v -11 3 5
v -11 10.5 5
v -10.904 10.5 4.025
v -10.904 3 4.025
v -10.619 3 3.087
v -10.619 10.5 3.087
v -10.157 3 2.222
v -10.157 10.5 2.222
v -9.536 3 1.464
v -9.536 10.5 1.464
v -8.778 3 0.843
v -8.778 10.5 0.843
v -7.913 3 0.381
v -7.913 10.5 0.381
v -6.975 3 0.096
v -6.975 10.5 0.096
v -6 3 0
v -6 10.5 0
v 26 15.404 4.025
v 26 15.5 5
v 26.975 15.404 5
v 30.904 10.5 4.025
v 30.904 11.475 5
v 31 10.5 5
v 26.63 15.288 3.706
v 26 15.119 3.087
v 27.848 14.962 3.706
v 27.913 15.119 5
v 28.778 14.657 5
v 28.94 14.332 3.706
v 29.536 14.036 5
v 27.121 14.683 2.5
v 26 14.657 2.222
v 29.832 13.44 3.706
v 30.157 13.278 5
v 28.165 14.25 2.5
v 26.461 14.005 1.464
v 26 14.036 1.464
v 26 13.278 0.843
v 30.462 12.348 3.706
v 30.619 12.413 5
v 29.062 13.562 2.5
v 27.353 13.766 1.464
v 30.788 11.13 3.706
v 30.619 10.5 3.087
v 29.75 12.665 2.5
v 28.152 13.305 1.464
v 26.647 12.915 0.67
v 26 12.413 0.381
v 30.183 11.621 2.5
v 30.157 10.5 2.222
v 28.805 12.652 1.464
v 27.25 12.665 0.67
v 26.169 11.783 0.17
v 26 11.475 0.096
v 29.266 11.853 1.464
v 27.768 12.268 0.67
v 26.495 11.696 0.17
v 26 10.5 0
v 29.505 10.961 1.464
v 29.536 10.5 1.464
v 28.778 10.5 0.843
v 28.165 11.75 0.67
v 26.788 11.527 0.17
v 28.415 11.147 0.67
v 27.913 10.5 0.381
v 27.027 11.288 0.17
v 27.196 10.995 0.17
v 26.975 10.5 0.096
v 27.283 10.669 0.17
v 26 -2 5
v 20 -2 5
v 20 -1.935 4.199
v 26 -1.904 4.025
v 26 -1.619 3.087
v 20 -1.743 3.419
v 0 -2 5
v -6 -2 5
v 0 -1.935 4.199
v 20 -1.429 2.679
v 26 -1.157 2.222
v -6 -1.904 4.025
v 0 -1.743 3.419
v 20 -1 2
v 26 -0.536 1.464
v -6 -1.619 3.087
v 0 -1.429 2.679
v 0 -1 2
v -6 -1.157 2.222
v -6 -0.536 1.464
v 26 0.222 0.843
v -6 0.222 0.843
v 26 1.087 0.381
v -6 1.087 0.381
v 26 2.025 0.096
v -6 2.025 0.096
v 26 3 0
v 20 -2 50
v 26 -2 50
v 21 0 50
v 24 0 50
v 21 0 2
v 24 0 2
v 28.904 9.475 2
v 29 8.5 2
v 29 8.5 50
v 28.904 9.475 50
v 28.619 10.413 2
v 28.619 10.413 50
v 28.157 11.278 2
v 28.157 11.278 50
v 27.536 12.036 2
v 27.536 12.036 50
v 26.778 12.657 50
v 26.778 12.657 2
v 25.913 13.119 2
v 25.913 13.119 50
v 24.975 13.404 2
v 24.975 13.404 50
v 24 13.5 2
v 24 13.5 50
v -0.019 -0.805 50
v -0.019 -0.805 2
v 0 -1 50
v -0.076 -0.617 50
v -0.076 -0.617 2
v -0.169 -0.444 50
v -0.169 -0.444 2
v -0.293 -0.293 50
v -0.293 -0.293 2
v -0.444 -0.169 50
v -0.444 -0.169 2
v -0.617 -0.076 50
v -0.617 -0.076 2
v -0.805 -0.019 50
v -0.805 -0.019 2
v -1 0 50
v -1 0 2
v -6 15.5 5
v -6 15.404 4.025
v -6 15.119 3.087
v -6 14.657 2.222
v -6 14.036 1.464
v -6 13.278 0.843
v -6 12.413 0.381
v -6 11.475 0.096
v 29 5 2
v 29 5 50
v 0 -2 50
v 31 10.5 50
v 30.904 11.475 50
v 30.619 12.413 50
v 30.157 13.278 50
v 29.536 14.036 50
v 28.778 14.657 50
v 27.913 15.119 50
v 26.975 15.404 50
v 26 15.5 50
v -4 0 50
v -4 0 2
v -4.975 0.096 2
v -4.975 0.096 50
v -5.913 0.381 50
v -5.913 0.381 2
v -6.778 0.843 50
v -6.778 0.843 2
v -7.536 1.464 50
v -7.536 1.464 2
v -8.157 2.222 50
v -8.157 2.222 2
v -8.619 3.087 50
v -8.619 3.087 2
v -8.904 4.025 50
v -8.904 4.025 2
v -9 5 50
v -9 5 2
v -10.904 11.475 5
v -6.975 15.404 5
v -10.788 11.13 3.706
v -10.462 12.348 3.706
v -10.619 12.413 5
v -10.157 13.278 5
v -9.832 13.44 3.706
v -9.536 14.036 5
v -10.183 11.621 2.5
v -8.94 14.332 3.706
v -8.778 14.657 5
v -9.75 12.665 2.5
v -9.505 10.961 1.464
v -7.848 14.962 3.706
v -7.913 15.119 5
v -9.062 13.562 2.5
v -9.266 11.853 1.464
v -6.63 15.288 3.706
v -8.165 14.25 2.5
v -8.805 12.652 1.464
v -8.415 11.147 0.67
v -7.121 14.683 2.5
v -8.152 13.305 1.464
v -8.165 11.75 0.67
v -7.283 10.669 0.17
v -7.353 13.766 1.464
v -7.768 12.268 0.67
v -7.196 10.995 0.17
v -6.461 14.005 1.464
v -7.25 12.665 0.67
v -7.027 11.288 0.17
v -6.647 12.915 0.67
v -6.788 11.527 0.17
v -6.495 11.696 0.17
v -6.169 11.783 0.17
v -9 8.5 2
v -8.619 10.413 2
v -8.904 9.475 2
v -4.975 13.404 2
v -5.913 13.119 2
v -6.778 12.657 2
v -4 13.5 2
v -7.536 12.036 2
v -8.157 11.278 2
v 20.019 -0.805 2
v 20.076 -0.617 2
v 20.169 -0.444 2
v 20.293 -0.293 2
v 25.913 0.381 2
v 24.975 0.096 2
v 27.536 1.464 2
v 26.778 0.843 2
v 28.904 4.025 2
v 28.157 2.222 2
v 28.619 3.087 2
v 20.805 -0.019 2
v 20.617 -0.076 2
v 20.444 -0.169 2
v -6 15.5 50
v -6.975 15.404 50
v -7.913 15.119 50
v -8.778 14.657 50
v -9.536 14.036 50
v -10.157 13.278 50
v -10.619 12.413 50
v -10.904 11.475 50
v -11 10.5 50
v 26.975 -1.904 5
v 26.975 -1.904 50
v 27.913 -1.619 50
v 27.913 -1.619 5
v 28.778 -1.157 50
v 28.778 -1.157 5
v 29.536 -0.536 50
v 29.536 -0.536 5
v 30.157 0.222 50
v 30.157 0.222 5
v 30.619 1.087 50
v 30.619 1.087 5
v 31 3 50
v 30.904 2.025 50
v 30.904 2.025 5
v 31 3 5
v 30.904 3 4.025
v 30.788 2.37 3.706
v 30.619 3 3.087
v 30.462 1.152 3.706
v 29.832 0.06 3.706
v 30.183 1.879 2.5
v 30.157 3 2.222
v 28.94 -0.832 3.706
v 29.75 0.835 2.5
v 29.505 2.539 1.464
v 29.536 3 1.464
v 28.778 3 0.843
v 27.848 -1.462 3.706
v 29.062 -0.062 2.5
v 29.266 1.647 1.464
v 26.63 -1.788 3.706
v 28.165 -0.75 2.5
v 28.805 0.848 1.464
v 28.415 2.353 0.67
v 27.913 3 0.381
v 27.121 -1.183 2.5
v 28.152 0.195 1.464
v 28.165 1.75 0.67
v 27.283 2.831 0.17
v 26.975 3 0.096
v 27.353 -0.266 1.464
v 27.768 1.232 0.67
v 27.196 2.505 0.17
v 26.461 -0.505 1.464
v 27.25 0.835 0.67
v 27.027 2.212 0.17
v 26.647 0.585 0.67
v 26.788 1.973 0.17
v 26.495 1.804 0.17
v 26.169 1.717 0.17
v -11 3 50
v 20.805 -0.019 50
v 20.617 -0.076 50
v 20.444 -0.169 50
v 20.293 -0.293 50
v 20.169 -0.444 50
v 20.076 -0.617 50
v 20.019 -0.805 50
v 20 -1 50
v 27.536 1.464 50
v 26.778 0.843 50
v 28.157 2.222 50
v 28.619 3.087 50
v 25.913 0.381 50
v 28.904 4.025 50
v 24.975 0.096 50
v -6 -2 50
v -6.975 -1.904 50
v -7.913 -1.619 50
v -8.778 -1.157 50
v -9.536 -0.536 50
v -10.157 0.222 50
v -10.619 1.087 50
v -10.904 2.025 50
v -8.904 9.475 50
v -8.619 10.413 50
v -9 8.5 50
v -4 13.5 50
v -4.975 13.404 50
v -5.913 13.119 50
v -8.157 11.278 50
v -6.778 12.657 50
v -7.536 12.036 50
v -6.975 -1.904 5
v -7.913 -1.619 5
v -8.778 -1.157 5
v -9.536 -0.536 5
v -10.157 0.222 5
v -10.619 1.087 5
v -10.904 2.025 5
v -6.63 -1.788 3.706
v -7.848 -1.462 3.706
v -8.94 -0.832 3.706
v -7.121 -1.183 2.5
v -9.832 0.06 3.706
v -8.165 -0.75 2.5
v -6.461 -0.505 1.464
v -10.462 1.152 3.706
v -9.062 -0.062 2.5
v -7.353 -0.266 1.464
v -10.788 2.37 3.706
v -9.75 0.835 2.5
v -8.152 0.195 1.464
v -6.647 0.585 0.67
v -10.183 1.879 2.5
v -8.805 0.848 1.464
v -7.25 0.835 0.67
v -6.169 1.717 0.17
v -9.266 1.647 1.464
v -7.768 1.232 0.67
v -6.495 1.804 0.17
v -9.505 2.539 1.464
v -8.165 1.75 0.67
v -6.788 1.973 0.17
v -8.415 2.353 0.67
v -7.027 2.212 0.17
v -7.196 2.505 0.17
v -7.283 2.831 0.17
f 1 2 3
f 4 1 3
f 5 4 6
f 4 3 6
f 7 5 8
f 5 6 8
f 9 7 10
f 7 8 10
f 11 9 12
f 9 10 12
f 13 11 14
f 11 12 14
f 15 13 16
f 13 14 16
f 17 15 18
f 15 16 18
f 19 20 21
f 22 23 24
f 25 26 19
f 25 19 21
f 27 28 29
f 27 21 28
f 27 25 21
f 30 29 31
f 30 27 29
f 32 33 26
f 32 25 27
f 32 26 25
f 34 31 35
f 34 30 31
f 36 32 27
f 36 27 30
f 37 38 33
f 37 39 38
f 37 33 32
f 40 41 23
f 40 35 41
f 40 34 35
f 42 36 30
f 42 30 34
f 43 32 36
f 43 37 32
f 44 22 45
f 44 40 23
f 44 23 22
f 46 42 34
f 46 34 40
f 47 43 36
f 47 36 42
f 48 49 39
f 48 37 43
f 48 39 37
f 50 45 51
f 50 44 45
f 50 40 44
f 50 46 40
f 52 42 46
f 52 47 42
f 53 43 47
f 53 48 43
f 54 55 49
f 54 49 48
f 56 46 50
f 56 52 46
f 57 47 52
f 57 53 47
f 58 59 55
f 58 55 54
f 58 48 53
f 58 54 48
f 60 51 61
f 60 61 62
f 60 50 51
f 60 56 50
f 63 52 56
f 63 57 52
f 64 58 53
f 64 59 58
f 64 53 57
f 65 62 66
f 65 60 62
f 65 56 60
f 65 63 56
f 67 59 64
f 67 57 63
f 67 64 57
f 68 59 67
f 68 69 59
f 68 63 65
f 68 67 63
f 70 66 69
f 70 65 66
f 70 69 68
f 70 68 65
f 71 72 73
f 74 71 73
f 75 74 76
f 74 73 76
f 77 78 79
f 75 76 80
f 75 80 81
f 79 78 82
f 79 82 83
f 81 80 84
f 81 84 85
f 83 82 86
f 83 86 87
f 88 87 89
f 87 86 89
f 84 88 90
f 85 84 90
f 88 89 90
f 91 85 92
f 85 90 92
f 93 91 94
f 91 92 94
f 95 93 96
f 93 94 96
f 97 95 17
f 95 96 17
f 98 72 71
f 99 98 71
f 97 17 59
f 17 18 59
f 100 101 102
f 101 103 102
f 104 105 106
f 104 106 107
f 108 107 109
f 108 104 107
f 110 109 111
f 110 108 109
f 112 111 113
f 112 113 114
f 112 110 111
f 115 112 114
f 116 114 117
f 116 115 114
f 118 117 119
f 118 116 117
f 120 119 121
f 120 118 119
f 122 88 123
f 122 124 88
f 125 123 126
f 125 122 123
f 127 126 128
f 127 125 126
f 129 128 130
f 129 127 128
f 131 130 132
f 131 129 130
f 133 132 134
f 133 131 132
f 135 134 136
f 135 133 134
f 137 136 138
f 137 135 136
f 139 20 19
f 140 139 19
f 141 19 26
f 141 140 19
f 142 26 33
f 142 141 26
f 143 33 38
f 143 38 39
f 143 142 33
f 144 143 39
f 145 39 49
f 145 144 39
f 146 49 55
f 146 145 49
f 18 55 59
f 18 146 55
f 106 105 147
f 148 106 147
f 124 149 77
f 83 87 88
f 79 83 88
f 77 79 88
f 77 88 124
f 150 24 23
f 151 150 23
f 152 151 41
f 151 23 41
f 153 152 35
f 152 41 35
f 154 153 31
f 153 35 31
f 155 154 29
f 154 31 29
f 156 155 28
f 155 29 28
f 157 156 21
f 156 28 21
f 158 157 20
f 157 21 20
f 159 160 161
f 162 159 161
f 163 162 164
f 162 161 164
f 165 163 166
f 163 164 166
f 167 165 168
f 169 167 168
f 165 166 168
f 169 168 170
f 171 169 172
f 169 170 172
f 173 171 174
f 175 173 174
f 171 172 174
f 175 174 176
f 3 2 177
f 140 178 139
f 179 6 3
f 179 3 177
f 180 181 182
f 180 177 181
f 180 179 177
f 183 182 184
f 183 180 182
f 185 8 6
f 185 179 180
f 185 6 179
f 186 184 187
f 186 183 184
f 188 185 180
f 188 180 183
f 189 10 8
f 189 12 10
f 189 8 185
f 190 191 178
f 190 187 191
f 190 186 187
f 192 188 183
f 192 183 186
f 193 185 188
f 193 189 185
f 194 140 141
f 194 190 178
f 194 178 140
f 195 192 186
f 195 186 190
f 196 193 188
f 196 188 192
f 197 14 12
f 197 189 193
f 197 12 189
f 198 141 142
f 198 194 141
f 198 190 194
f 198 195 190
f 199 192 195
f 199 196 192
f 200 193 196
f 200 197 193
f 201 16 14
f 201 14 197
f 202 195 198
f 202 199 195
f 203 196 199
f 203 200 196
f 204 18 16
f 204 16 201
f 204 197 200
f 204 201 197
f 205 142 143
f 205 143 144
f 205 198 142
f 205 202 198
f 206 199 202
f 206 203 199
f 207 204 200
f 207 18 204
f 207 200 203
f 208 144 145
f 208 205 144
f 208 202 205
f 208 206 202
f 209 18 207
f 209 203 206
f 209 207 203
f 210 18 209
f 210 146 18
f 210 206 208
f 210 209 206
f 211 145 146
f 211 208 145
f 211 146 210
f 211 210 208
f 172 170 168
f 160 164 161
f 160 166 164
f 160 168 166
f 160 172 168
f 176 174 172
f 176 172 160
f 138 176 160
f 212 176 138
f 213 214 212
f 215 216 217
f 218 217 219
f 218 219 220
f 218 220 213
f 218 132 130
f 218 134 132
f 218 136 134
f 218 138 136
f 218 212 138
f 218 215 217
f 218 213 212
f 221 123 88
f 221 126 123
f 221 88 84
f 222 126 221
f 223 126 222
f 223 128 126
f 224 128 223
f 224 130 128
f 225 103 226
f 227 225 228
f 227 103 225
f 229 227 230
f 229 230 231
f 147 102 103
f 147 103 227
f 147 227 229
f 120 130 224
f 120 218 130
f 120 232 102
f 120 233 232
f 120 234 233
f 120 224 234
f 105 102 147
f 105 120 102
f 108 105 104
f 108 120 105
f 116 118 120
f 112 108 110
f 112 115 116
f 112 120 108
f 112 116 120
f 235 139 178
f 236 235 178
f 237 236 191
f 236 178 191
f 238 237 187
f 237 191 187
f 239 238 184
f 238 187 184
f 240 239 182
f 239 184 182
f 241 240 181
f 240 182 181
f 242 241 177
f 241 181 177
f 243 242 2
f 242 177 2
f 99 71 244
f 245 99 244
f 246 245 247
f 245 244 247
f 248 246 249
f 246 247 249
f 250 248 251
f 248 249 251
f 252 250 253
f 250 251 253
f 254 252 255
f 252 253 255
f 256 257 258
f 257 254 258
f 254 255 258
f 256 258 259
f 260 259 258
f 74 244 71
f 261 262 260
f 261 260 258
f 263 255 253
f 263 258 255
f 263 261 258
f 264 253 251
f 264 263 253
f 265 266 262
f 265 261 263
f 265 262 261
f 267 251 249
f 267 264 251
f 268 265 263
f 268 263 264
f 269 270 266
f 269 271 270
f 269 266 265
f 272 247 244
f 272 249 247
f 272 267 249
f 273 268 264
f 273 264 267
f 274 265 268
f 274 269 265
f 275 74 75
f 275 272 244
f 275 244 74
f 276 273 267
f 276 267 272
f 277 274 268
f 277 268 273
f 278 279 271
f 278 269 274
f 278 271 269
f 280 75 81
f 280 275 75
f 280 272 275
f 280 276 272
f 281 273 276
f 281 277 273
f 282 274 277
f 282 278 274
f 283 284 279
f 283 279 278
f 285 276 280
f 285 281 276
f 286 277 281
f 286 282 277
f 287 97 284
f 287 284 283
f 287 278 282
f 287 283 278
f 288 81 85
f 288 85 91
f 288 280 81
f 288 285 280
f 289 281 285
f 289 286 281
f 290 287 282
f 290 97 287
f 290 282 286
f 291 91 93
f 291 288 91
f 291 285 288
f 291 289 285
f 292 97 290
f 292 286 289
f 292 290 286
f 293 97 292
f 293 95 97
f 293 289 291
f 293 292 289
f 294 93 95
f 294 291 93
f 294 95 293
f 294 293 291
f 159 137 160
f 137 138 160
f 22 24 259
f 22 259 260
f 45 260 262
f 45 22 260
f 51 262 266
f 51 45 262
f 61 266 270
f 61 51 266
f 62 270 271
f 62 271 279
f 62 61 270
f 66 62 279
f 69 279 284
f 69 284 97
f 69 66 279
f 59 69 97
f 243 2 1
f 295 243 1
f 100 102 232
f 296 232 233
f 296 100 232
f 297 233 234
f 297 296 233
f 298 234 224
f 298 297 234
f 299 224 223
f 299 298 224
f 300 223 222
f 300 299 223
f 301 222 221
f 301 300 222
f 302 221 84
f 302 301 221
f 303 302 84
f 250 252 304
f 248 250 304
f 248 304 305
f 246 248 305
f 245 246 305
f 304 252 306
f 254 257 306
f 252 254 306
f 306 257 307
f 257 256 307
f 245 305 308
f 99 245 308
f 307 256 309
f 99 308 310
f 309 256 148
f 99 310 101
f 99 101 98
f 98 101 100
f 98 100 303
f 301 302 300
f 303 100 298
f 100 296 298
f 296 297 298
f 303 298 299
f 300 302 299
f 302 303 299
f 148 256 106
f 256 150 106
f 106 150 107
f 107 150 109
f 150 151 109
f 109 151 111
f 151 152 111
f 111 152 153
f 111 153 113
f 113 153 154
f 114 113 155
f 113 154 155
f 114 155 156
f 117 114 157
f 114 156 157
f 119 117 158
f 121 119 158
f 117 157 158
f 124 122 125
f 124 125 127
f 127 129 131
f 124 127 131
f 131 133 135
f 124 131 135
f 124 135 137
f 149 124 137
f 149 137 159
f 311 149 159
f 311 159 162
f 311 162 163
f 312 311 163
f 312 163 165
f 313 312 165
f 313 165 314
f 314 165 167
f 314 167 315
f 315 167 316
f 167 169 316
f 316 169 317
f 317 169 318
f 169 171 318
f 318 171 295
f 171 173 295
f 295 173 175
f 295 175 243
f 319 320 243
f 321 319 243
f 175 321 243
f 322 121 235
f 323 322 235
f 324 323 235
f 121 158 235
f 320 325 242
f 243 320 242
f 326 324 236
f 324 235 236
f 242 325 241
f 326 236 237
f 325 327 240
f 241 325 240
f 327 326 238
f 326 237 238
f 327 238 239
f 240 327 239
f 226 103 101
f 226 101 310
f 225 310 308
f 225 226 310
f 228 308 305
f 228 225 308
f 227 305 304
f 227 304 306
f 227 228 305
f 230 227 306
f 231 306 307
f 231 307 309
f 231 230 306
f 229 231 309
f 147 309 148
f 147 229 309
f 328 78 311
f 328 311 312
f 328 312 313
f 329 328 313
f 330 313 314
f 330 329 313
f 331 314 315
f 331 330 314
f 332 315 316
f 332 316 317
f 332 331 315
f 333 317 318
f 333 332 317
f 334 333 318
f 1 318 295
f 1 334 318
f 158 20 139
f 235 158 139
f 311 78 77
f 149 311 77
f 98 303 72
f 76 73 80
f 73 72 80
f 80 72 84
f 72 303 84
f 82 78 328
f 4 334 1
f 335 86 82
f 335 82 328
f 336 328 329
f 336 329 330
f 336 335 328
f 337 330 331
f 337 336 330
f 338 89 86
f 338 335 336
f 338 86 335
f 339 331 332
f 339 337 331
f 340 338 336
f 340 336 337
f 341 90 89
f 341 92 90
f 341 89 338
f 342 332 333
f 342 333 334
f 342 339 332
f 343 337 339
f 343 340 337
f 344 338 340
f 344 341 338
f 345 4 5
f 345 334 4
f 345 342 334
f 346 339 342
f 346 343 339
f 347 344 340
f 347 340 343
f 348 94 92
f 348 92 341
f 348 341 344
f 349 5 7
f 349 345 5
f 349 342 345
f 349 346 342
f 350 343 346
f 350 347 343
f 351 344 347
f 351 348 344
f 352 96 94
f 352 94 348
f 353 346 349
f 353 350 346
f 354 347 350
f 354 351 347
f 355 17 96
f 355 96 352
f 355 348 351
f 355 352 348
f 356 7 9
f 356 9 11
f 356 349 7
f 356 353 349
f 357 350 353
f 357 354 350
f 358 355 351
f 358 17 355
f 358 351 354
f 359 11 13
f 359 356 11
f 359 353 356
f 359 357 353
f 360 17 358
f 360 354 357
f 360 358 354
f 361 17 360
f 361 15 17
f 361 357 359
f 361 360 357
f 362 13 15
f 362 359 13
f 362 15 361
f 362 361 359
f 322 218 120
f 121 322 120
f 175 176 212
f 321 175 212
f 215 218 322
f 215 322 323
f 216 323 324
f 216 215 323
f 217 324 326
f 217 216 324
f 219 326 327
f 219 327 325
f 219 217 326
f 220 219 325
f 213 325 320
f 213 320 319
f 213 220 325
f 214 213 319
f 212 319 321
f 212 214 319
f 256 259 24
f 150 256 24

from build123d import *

# Parameters (mm, degrees)
F1_DEPTH     = 50
F0_W         = 20
F0_H         = 2
F2_DEPTH     = 2
F3_T1_DEPTH  = 48
F3_T3_DEPTH  = 57.5
F3_T5_DEPTH  = 32
F3_T7_DEPTH  = 7.5
F3_S11_W     = 5
F3_S11_H     = 5
F3_T12_DEPTH = 5
F3_S17_W     = 5
F3_S17_H     = 5
F3_T18_DEPTH = 5
F3_S23_W     = 5
F3_S23_H     = 5
F3_T24_DEPTH = 5
F3_S29_W     = 5
F3_S29_H     = 5
F3_T30_DEPTH = 5
F4_R         = 1


# Not quite as in the source:
# - a fillet or chamfer that OpenCascade refuses, or shapes differently, is made with other operations: its cross-section is extruded or revolved along the edge and cut away or added


with BuildPart() as f1:
    # F0 (on Top) → F1 (new body)
    with BuildSketch(Plane.XY):
        Polygon((0, 0), (-9, 0), (-9, 13.5), (29, 13.5), (29, 0), (20, 0), (20, -2), (31, -2), (31, 15.5), (-11, 15.5), (-11, -2), (0, -2), align=None)
    extrude(amount=F1_DEPTH)

    # F0 (on Top) → F2 (join)
    with BuildSketch(Plane.XY):
        Polygon((-9, 13.5), (-9, 0), (0, 0), (20, 0), (29, 0), (29, 13.5), align=None)
        with Locations((10, -1)):
            Rectangle(F0_W, F0_H)
    extrude(amount=F2_DEPTH)

    # F3: fillet of radius 5 on 12 edges, made by hand

    # F3_s2 → F3_t1 (join)
    with BuildSketch(Plane.XY.offset(2)):
        with BuildLine():
            ThreePointArc((24, 0), (27.5355339059, 1.4644660941), (29, 5))
            Line((29, 5), (29, 0))
            Line((29, 0), (24, 0))
        make_face()
        with BuildLine():
            ThreePointArc((29, 8.5), (27.5355339059, 12.0355339059), (24, 13.5))
            Line((24, 13.5), (29, 13.5))
            Line((29, 13.5), (29, 8.5))
        make_face()
        with BuildLine():
            ThreePointArc((-4, 0), (-7.5355339059, 1.4644660941), (-9, 5))
            Line((-9, 5), (-9, 0))
            Line((-9, 0), (-4, 0))
        make_face()
        with BuildLine():
            ThreePointArc((-4, 13.5), (-7.5355339059, 12.0355339059), (-9, 8.5))
            Line((-9, 8.5), (-9, 13.5))
            Line((-9, 13.5), (-4, 13.5))
        make_face()
    extrude(amount=F3_T1_DEPTH)

    # F3_s4 → F3_t3 (cut)
    with BuildSketch(Plane.XY.offset(5)):
        with BuildLine():
            ThreePointArc((-6, 15.5), (-9.5355339059, 14.0355339059), (-11, 10.5))
            Line((-11, 10.5), (-11, 15.5))
            Line((-11, 15.5), (-6, 15.5))
        make_face()
        with BuildLine():
            ThreePointArc((-6, -2), (-9.5355339059, -0.5355339059), (-11, 3))
            Line((-11, 3), (-11, -2))
            Line((-11, -2), (-6, -2))
        make_face()
        with BuildLine():
            ThreePointArc((31, 10.5), (29.5355339059, 14.0355339059), (26, 15.5))
            Line((26, 15.5), (31, 15.5))
            Line((31, 15.5), (31, 10.5))
        make_face()
        with BuildLine():
            ThreePointArc((26, -2), (29.5355339059, -0.5355339059), (31, 3))
            Line((31, 3), (31, -2))
            Line((31, -2), (26, -2))
        make_face()
    extrude(amount=F3_T3_DEPTH, mode=Mode.SUBTRACT)

    # F3_s6 → F3_t5 (cut)
    with BuildSketch(Plane.YZ.offset(-6)):
        with BuildLine():
            ThreePointArc((-2, 5), (-0.5355339059, 1.4644660941), (3, 0))
            Line((3, 0), (-2, 0))
            Line((-2, 0), (-2, 5))
        make_face()
        with BuildLine():
            ThreePointArc((15.5, 5), (14.0355339059, 1.4644660941), (10.5, 0))
            Line((10.5, 0), (15.5, 0))
            Line((15.5, 0), (15.5, 5))
        make_face()
    extrude(amount=F3_T5_DEPTH, mode=Mode.SUBTRACT)

    # F3_s8 → F3_t7 (cut)
    with BuildSketch(Plane.XZ.offset(-10.5)):
        with BuildLine():
            ThreePointArc((31, 5), (29.5355339059, 1.4644660941), (26, 0))
            Line((26, 0), (31, 0))
            Line((31, 0), (31, 5))
        make_face()
        with BuildLine():
            ThreePointArc((-11, 5), (-9.5355339059, 1.4644660941), (-6, 0))
            Line((-6, 0), (-11, 0))
            Line((-11, 0), (-11, 5))
        make_face()
    extrude(amount=F3_T7_DEPTH, mode=Mode.SUBTRACT)


with BuildPart() as f3_tool10:
    # F3_s11 → F3_t12 (new body)
    with BuildSketch(Plane.XY.offset(5)):
        with Locations((-8.5, 13)):
            Rectangle(F3_S11_W, F3_S11_H)
    extrude(amount=-F3_T12_DEPTH)

    # F3_s13 → F3_t14 (revolve, cut)
    with BuildSketch(Plane(origin=(-6, 10.5, 5), x_dir=(0.7071067812, -0.7071067812, 0), z_dir=(0.7071067812, 0.7071067812, 0))):
        with BuildLine():
            ThreePointArc((0, -5), (5, 0), (0, 5))
            Line((0, 5), (0, -5))
        make_face()
    revolve(axis=Axis((-6, 10.5, 5), (0, 0, -1)), mode=Mode.SUBTRACT)


with BuildPart() as f1_1:
    add(f1.part)

    # F3_t9: cut F3_tool10
    add(f3_tool10.part, mode=Mode.SUBTRACT)


with BuildPart() as f3_tool16:
    # F3_s17 → F3_t18 (new body)
    with BuildSketch(Plane.XY.offset(5)):
        with Locations((-8.5, 0.5)):
            Rectangle(F3_S17_W, F3_S17_H)
    extrude(amount=-F3_T18_DEPTH)

    # F3_s19 → F3_t20 (revolve, cut)
    with BuildSketch(Plane(origin=(-6, 3, 5), x_dir=(0.7071067812, 0.7071067812, 0), z_dir=(-0.7071067812, 0.7071067812, 0))):
        with BuildLine():
            ThreePointArc((0, -5), (5, 0), (0, 5))
            Line((0, 5), (0, -5))
        make_face()
    revolve(axis=Axis((-6, 3, 5), (0, 0, -1)), mode=Mode.SUBTRACT)


with BuildPart() as f1_2:
    add(f1_1.part)

    # F3_t15: cut F3_tool16
    add(f3_tool16.part, mode=Mode.SUBTRACT)


with BuildPart() as f3_tool22:
    # F3_s23 → F3_t24 (new body)
    with BuildSketch(Plane.XY.offset(5)):
        with Locations((28.5, 13)):
            Rectangle(F3_S23_W, F3_S23_H)
    extrude(amount=-F3_T24_DEPTH)

    # F3_s25 → F3_t26 (revolve, cut)
    with BuildSketch(Plane(origin=(26, 10.5, 5), x_dir=(-0.7071067812, -0.7071067812, 0), z_dir=(0.7071067812, -0.7071067812, 0))):
        with BuildLine():
            ThreePointArc((0, -5), (5, 0), (0, 5))
            Line((0, 5), (0, -5))
        make_face()
    revolve(axis=Axis((26, 10.5, 5), (0, 0, -1)), mode=Mode.SUBTRACT)


with BuildPart() as f1_3:
    add(f1_2.part)

    # F3_t21: cut F3_tool22
    add(f3_tool22.part, mode=Mode.SUBTRACT)


with BuildPart() as f3_tool28:
    # F3_s29 → F3_t30 (new body)
    with BuildSketch(Plane.XY.offset(5)):
        with Locations((28.5, 0.5)):
            Rectangle(F3_S29_W, F3_S29_H)
    extrude(amount=-F3_T30_DEPTH)

    # F3_s31 → F3_t32 (revolve, cut)
    with BuildSketch(Plane(origin=(26, 3, 5), x_dir=(-0.7071067812, 0.7071067812, 0), z_dir=(-0.7071067812, -0.7071067812, 0))):
        with BuildLine():
            ThreePointArc((0, -5), (5, 0), (0, 5))
            Line((0, 5), (0, -5))
        make_face()
    revolve(axis=Axis((26, 3, 5), (0, 0, -1)), mode=Mode.SUBTRACT)


with BuildPart() as f1_4:
    add(f1_3.part)

    # F3_t27: cut F3_tool28
    add(f3_tool28.part, mode=Mode.SUBTRACT)

    # F4
    f4_edges = [f1_4.edges().sort_by_distance(p)[0] for p in [
        (0, 0, 26),
        (20, 0, 26),
    ]]
    fillet(f4_edges, radius=F4_R)


solid = f1_4.part
